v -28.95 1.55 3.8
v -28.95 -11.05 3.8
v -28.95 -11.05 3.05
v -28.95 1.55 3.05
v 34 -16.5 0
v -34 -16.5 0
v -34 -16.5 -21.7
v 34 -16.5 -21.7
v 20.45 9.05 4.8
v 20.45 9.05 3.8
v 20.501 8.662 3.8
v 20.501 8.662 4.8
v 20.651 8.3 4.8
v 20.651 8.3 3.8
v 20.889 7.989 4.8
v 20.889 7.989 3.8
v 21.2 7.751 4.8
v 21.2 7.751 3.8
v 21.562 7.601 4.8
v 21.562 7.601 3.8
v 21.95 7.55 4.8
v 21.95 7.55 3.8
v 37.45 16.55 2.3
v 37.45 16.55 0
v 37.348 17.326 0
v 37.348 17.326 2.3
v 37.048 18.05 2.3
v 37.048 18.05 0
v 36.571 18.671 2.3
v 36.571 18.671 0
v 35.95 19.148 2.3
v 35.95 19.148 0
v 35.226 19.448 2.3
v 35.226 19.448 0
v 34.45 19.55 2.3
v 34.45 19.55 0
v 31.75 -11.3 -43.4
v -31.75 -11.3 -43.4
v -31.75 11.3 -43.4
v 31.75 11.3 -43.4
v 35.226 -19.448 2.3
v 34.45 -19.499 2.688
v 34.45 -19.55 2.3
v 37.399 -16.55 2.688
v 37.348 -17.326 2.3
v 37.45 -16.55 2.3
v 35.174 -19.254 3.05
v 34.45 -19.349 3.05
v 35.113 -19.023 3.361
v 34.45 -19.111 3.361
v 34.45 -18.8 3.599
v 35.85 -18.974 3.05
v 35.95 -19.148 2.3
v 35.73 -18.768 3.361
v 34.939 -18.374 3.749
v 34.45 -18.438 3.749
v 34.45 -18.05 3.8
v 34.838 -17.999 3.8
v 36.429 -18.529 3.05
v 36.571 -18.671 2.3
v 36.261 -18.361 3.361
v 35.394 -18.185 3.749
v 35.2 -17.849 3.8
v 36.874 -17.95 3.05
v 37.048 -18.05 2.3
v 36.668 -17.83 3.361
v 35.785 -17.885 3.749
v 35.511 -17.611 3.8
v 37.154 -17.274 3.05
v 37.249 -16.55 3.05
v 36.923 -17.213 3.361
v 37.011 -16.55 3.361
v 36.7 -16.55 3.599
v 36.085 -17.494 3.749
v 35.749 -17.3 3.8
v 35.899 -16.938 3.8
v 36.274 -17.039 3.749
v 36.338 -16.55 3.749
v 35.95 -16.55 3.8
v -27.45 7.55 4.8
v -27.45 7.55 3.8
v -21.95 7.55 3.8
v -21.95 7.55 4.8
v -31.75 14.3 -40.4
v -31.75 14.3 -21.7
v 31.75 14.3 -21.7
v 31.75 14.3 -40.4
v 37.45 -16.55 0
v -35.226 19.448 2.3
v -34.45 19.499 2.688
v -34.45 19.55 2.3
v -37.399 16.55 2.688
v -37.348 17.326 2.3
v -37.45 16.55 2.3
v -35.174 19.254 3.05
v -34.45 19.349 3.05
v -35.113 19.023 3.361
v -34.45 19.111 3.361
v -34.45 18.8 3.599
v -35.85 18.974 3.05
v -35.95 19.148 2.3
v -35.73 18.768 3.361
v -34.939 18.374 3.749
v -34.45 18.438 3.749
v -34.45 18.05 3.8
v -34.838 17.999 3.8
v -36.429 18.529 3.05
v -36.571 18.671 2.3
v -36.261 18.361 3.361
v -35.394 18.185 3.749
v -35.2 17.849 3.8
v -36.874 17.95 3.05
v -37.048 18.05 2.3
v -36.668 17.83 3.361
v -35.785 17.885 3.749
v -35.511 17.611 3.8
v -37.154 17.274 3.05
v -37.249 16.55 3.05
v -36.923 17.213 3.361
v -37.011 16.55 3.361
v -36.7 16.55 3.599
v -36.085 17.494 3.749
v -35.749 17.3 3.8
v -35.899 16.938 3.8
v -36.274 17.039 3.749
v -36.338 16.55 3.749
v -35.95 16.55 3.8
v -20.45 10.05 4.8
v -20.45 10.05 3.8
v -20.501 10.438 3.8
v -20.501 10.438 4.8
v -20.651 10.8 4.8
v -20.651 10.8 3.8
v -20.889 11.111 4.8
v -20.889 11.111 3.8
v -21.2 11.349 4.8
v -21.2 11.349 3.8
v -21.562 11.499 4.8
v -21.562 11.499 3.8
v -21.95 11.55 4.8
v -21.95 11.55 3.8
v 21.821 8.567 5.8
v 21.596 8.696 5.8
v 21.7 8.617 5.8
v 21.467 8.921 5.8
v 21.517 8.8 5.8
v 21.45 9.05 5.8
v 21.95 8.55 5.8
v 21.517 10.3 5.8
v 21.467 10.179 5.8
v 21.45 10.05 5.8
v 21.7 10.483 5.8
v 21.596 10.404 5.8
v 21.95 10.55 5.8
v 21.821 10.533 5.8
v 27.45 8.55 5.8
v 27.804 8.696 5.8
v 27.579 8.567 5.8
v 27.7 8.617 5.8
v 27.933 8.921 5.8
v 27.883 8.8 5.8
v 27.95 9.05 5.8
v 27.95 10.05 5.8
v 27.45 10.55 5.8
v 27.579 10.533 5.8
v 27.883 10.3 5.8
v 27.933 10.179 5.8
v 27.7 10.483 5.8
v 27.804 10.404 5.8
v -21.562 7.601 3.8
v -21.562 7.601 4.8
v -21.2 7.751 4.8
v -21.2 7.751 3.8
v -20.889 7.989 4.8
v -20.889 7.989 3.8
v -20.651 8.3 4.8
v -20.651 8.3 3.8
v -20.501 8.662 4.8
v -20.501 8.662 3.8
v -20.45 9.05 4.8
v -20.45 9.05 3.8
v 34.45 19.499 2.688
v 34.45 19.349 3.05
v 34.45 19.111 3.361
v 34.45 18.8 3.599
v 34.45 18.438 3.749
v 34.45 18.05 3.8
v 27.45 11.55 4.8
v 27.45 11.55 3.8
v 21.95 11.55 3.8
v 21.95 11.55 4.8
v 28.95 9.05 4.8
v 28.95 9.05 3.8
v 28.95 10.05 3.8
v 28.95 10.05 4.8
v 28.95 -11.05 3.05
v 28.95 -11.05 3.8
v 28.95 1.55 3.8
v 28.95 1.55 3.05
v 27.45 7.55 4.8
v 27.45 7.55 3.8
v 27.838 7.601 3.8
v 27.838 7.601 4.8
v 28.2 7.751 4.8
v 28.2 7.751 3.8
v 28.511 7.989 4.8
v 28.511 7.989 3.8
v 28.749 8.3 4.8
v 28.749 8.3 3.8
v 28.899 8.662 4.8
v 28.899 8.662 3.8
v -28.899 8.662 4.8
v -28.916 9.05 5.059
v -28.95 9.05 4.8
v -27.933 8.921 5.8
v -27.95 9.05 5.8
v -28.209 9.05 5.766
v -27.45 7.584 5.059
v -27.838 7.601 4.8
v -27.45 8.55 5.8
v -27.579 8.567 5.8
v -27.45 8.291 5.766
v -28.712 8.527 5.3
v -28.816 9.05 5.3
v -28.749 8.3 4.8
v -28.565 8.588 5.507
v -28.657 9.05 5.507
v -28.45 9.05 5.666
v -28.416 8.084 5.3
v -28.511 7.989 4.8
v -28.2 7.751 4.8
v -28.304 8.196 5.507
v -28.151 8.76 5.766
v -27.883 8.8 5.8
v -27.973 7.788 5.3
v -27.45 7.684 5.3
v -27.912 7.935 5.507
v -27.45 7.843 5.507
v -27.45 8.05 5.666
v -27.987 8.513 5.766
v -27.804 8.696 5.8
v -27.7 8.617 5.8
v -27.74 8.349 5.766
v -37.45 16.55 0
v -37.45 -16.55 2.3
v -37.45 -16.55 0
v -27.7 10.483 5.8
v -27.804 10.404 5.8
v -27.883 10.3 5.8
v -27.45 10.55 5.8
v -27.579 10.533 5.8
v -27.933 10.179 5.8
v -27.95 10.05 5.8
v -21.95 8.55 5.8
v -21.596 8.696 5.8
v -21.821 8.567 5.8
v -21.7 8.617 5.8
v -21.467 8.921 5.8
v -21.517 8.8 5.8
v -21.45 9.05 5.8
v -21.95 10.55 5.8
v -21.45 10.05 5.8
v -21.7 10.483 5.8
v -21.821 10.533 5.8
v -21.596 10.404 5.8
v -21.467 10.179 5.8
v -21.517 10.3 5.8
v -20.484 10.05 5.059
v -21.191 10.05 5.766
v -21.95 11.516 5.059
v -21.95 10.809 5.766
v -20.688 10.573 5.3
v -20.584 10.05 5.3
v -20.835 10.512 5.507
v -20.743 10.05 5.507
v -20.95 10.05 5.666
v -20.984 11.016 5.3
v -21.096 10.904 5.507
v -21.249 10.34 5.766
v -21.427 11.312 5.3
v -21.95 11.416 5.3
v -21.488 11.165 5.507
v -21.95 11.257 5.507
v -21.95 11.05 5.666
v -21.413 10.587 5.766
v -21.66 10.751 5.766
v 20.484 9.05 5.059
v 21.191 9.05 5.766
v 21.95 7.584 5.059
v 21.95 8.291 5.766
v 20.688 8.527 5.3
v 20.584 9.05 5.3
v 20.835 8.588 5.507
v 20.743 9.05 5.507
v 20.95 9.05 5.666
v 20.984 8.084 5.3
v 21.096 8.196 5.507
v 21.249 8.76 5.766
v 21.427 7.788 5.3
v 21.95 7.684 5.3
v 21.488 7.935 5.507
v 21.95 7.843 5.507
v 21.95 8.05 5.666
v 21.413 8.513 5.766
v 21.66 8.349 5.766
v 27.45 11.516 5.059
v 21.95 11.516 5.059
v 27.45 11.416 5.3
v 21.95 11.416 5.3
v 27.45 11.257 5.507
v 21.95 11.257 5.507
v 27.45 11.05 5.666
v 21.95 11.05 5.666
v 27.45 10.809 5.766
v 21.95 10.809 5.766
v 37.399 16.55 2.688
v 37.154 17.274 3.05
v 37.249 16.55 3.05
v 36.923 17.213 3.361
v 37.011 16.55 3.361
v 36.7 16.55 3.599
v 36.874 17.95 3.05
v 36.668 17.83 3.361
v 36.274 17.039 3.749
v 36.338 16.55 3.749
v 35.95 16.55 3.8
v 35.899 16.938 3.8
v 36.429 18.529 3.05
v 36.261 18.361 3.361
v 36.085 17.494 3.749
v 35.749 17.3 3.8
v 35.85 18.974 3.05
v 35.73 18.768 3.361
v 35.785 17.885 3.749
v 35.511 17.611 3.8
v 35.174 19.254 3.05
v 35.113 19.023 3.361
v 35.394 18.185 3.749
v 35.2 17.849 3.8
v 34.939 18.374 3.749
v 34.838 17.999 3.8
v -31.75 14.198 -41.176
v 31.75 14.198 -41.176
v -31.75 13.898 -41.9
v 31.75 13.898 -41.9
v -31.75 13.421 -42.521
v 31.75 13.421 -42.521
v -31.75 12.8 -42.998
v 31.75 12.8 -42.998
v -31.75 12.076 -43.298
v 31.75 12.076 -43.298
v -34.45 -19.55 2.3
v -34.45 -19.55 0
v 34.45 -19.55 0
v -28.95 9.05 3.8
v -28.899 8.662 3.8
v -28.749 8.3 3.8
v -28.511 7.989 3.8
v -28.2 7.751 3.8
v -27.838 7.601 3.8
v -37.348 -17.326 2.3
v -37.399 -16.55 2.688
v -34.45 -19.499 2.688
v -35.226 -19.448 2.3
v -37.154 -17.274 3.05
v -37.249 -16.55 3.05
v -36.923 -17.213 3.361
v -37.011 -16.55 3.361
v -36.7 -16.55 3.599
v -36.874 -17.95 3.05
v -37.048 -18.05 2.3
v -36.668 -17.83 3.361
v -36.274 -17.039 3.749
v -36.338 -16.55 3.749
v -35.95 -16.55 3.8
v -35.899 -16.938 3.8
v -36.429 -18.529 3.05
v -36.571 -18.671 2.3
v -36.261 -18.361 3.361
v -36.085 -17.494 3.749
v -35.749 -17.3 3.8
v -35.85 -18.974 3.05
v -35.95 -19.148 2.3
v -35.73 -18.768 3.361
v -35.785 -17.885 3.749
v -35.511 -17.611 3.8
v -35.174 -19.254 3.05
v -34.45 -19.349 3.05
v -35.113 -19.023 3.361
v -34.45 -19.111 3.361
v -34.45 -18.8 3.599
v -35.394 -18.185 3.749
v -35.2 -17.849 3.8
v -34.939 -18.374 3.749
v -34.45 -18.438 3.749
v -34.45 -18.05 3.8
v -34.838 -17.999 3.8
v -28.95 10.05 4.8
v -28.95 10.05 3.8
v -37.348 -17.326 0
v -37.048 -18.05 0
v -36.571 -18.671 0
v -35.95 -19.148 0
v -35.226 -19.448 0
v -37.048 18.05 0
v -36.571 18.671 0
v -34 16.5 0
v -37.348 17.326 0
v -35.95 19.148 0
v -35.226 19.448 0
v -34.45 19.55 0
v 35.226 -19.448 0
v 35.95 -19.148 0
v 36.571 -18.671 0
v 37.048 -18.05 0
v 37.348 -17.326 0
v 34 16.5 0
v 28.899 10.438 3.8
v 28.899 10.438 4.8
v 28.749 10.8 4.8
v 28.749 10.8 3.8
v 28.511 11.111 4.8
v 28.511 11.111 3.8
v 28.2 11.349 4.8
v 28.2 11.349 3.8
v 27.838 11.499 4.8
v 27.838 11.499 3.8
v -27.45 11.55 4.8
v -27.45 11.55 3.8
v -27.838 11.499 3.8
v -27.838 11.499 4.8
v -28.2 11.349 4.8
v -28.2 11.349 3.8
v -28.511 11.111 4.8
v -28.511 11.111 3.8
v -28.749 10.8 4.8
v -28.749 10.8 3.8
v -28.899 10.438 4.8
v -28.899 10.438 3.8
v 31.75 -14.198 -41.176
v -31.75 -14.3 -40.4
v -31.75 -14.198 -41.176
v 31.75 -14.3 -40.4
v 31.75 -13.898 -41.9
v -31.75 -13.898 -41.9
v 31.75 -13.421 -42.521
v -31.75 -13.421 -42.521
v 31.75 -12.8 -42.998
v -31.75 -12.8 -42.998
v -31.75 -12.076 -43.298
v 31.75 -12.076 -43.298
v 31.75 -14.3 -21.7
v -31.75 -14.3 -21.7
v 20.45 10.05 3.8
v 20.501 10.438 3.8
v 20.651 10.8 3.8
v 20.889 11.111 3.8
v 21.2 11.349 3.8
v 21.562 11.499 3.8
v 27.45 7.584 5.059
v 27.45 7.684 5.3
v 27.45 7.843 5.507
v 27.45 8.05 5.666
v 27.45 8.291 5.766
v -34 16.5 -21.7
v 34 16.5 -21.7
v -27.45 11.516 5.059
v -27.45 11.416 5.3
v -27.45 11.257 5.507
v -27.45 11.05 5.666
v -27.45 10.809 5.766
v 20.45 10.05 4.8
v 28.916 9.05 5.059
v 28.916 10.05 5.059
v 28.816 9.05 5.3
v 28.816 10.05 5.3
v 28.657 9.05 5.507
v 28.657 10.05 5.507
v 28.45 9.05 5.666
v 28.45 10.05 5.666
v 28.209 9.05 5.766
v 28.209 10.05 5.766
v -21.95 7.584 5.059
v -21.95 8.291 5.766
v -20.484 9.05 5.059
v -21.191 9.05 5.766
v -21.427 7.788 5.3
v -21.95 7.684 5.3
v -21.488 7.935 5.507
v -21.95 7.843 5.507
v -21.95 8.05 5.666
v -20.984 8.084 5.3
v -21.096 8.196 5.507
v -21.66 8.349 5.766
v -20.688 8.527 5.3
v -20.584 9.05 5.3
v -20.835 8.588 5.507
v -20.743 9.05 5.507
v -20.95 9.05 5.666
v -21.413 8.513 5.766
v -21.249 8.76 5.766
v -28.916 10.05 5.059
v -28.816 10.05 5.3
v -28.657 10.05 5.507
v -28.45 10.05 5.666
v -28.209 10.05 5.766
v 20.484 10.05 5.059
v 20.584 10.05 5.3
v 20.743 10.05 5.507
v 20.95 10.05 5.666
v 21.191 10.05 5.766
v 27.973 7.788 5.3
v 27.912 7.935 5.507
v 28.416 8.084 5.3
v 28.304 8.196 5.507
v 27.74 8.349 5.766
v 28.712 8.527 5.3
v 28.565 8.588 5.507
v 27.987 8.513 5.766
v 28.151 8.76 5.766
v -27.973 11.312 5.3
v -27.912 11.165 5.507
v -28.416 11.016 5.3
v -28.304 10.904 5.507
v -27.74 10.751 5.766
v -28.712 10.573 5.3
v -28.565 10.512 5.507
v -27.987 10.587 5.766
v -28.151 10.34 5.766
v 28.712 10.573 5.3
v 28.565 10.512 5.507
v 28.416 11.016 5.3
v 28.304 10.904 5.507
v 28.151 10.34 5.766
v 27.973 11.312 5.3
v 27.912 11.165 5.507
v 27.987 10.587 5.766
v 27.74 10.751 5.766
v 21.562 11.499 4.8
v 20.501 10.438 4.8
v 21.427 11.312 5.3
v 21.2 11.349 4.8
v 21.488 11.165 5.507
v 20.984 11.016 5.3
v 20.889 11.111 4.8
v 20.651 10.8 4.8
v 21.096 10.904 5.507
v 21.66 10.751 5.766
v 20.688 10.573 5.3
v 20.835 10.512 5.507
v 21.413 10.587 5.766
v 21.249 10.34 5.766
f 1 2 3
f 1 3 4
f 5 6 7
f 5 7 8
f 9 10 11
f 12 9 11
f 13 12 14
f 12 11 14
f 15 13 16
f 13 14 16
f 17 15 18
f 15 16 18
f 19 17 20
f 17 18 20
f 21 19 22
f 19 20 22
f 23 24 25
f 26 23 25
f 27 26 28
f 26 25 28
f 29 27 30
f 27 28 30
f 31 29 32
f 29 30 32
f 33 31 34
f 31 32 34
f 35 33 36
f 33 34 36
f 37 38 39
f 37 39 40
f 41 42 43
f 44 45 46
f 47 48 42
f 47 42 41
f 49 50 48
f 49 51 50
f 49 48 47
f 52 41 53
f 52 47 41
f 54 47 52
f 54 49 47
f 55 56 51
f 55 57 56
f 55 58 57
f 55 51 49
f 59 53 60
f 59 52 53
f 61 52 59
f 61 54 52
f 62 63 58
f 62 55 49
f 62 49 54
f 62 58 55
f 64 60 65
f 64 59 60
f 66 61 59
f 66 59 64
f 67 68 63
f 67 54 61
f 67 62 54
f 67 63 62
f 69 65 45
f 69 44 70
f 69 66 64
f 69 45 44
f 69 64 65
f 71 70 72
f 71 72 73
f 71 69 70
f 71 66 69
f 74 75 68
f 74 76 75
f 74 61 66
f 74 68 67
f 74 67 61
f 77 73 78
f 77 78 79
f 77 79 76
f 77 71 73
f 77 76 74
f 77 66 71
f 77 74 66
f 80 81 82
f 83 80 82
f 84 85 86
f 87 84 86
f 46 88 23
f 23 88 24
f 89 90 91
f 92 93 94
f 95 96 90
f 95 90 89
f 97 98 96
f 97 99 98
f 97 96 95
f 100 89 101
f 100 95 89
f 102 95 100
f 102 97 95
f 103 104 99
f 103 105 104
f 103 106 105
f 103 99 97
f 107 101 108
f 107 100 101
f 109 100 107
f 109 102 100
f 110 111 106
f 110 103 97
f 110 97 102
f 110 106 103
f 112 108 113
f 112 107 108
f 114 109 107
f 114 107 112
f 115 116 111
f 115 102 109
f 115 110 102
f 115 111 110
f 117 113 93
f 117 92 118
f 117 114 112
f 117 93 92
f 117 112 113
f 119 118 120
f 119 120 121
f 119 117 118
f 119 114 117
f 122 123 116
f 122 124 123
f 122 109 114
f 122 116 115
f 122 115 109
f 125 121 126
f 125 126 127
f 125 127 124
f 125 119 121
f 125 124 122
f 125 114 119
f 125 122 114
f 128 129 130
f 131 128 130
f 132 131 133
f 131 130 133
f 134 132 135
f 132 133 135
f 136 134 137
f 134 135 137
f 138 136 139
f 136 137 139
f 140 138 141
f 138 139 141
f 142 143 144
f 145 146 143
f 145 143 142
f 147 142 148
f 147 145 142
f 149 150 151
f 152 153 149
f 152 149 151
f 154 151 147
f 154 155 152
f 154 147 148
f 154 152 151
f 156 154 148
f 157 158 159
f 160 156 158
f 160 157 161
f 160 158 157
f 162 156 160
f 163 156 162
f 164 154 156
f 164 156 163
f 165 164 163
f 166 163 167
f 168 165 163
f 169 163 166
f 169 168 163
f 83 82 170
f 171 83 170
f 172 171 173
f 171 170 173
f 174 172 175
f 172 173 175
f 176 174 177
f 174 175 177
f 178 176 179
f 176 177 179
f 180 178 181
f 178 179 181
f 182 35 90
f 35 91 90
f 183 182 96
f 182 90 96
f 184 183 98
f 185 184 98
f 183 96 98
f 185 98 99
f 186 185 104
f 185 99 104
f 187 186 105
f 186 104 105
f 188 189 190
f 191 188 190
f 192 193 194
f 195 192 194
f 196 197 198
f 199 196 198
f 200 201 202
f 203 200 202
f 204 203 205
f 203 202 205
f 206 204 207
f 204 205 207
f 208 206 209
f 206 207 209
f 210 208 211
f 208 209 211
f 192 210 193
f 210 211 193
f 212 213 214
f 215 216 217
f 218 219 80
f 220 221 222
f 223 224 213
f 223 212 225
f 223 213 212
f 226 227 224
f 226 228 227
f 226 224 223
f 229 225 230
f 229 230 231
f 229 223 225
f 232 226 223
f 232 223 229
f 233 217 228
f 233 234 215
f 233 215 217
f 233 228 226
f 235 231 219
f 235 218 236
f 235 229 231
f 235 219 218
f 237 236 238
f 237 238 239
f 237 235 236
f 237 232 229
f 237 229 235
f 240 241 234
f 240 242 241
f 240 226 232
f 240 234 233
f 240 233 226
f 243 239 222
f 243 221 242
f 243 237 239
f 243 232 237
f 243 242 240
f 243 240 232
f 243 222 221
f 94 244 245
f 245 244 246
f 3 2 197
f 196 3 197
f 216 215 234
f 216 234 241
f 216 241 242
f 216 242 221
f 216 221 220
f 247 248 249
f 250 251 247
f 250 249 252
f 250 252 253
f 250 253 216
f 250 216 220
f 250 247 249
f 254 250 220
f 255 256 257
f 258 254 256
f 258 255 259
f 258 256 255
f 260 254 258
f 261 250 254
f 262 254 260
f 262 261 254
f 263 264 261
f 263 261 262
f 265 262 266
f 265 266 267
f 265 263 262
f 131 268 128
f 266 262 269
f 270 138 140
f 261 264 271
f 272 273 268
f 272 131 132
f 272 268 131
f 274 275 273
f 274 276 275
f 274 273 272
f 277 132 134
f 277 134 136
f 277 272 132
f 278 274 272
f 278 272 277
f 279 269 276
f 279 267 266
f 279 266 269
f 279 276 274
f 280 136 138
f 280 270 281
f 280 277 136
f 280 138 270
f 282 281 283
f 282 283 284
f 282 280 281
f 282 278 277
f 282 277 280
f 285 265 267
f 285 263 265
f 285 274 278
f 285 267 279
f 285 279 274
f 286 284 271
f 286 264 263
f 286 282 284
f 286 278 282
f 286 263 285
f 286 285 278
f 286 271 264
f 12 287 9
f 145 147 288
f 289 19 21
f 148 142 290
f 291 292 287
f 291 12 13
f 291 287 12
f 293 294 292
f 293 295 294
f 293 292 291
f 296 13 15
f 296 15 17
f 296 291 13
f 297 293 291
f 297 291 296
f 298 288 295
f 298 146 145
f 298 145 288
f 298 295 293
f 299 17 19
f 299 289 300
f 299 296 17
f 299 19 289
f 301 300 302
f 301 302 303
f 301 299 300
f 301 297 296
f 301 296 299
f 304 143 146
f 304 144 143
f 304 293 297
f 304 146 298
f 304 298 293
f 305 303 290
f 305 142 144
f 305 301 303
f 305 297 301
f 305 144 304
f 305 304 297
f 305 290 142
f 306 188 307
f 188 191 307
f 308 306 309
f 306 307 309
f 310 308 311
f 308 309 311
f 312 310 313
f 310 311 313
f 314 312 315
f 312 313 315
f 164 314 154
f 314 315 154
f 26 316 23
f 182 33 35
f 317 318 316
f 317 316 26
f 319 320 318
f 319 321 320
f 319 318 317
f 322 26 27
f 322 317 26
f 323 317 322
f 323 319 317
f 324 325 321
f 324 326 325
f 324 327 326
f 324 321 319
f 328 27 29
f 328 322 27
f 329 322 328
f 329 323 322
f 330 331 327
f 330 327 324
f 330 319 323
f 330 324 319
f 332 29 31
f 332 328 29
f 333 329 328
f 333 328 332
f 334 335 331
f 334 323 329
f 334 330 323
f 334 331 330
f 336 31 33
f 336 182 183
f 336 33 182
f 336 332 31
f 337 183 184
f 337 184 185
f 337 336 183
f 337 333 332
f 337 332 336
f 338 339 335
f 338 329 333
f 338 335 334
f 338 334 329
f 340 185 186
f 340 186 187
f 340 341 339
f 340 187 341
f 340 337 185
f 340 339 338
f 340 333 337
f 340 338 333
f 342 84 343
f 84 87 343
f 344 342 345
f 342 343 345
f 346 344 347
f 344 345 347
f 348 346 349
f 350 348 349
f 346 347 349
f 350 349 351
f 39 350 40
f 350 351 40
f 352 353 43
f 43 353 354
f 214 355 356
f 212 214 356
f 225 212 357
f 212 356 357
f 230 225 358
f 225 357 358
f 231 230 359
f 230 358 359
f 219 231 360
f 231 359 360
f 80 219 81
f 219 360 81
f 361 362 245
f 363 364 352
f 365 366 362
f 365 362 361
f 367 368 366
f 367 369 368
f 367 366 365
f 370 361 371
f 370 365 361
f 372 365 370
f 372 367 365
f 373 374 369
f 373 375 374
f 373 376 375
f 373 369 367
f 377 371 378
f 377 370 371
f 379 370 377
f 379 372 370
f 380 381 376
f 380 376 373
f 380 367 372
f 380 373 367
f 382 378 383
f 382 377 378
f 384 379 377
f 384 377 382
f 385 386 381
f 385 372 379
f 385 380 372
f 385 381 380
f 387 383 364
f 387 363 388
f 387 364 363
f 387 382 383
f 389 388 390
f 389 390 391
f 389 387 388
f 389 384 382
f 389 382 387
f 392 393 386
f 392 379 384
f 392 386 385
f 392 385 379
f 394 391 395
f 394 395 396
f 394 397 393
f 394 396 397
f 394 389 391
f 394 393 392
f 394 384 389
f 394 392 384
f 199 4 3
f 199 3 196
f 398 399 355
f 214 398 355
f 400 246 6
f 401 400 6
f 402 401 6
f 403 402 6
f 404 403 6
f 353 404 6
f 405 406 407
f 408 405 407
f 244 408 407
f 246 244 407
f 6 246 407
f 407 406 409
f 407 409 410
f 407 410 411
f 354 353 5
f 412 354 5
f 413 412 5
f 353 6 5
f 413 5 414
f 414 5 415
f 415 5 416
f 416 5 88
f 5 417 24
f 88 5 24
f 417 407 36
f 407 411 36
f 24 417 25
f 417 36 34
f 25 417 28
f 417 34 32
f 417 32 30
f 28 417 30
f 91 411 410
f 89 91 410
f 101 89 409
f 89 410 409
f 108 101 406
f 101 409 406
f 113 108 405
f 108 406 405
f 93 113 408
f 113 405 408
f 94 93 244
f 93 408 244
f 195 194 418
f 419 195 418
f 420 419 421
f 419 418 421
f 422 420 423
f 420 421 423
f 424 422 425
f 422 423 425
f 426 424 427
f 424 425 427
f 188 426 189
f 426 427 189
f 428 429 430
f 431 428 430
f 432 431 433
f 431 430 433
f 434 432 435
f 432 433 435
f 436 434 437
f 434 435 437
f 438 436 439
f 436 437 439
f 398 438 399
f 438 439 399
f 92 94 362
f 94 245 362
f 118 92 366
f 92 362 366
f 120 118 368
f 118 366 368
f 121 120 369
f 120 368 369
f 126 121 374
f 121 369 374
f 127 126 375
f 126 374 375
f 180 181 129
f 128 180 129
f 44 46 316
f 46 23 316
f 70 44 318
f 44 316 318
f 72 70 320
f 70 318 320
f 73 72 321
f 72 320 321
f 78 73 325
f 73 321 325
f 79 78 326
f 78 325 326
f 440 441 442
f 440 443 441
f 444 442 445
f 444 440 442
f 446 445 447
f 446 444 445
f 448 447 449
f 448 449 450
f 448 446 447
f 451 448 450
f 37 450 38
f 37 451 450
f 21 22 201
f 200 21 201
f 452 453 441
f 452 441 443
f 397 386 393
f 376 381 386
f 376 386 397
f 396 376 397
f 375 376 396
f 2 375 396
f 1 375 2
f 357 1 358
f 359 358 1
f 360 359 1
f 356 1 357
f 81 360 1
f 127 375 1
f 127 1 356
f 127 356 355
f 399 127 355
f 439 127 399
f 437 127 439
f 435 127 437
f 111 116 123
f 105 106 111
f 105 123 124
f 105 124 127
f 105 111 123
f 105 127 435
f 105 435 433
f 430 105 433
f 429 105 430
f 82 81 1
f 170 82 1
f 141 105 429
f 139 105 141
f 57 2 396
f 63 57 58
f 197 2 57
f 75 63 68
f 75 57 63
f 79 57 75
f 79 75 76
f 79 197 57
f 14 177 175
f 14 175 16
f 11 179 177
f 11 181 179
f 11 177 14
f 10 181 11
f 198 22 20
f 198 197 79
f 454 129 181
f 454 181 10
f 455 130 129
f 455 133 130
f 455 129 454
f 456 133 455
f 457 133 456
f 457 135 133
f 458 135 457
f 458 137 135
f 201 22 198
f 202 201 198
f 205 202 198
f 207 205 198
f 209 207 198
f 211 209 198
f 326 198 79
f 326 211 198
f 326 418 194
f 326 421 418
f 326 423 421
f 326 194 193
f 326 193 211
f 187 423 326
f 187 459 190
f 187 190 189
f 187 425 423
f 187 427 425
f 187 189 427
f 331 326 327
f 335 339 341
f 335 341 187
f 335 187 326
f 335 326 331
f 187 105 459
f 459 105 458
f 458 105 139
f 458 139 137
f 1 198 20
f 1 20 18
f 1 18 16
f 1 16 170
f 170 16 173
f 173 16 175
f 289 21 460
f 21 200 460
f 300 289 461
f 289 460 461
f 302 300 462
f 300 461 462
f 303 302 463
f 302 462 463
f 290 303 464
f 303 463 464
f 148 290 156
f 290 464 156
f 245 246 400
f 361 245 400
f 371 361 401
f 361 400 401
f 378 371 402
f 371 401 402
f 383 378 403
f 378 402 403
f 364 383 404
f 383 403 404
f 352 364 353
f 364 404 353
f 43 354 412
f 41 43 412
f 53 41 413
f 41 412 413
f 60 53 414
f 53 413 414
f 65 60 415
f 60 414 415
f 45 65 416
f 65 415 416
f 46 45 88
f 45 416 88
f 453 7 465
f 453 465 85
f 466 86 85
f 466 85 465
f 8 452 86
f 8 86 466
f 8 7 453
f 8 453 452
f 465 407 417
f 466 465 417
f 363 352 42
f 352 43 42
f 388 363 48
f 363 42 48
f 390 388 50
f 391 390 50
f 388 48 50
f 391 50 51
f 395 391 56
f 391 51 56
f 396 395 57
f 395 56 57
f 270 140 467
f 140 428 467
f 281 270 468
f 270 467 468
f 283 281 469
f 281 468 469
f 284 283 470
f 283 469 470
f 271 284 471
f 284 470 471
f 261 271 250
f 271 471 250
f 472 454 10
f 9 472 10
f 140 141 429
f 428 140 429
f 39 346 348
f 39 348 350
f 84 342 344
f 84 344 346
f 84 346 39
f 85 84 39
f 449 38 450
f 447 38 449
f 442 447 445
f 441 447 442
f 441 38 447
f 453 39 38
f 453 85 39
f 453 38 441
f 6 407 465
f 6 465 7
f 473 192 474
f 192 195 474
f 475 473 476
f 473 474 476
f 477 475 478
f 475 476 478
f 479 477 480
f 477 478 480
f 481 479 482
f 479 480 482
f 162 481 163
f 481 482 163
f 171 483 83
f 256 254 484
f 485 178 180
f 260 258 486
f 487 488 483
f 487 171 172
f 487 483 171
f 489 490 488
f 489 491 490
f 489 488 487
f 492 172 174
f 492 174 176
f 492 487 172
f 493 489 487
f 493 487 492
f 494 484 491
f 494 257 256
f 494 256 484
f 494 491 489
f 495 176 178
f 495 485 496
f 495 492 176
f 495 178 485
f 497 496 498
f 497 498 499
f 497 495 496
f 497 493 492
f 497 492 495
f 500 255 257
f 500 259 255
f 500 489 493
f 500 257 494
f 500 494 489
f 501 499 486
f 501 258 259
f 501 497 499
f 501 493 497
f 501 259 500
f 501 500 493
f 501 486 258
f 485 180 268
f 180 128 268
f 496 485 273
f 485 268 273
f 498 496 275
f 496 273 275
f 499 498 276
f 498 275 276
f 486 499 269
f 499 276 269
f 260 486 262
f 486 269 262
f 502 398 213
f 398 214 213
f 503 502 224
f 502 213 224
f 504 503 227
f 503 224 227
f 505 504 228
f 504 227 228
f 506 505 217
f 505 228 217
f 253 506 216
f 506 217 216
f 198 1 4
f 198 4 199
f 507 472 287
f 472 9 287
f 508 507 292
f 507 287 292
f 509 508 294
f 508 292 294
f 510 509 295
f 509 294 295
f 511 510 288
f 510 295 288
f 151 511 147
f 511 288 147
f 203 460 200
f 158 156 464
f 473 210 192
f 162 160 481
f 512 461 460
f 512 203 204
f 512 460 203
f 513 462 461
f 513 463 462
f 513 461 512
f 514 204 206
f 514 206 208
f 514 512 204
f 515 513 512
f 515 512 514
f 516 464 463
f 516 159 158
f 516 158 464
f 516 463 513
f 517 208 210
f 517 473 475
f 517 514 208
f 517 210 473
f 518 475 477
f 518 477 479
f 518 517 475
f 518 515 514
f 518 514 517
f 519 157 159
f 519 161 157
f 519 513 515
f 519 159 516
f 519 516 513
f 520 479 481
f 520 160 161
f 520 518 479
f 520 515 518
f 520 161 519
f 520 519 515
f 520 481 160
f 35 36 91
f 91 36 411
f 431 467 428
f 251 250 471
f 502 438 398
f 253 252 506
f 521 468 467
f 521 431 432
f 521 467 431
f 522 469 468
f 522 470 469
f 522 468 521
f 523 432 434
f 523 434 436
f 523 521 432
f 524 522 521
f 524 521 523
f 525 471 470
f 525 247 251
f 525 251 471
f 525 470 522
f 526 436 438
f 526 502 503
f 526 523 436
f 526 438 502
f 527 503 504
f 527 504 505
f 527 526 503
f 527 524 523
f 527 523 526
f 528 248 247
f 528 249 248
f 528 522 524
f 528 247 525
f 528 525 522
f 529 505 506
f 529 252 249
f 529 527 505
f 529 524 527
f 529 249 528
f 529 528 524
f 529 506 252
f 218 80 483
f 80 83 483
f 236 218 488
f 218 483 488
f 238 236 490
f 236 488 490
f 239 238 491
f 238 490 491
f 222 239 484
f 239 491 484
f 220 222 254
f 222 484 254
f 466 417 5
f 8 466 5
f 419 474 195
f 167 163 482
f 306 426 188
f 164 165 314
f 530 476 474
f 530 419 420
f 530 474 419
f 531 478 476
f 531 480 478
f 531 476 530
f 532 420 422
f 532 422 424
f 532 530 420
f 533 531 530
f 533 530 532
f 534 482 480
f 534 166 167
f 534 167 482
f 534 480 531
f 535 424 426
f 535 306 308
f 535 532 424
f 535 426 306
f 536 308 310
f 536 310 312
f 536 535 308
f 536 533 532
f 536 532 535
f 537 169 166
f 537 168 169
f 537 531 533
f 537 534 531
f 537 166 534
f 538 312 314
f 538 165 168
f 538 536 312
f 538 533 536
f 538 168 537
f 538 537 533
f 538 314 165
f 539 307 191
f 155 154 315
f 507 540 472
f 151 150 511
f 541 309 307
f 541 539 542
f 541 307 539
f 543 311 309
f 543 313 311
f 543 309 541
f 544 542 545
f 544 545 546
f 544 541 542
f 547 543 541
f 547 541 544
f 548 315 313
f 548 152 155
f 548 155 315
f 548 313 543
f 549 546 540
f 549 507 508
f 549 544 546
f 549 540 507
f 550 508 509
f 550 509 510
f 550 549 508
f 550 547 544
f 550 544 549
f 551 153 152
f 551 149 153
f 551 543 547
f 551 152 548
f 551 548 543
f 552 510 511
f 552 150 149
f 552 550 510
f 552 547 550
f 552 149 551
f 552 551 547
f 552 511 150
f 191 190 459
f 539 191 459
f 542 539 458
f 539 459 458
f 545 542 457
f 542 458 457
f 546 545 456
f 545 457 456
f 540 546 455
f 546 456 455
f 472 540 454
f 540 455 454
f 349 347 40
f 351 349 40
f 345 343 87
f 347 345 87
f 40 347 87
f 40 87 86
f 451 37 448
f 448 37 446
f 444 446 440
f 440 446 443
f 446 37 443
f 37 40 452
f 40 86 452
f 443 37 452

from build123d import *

# Parameters (mm, degrees)
F1_DEPTH  = 3.8
F2_R      = 1.5
F3_W      = 68
F3_H      = 33
F4_DEPTH  = 21.7
F5_W      = 63.5
F5_H      = 28.6
F6_DEPTH  = 21.7
F7_R      = 3
F9_DEPTH  = 2
F10_R     = 1
F8_W      = 57.9
F8_H      = 12.6
F11_DEPTH = 0.75


with BuildPart() as f1:
    # F0 (on Top) → F1 (new body)
    with BuildSketch(Plane.XY):
        with BuildLine():
            Line((-34.45, -19.55), (34.45, -19.55))
            ThreePointArc((34.45, -19.55), (36.57132, -18.67132), (37.45, -16.55))
            Line((37.45, -16.55), (37.45, 16.55))
            ThreePointArc((37.45, 16.55), (36.57132, 18.67132), (34.45, 19.55))
            Line((34.45, 19.55), (-34.45, 19.55))
            ThreePointArc((-34.45, 19.55), (-36.57132, 18.67132), (-37.45, 16.55))
            Line((-37.45, 16.55), (-37.45, -16.55))
            ThreePointArc((-37.45, -16.55), (-36.57132, -18.67132), (-34.45, -19.55))
        make_face()
    extrude(amount=F1_DEPTH)

    # F2
    f2_edges = [f1.edges().sort_by_distance(p)[0] for p in [
        (0, -19.55, 3.8),
        (36.57132, -18.67132, 3.8),
        (37.45, 0, 3.8),
        (36.57132, 18.67132, 3.8),
        (0, 19.55, 3.8),
        (-36.57132, 18.67132, 3.8),
        (-37.45, 0, 3.8),
        (-36.57132, -18.67132, 3.8),
    ]]
    fillet(f2_edges, radius=F2_R)

    # F3 (on face) → F4 (join)
    with BuildSketch(Plane(origin=(0, 0, 0), x_dir=(1, 0, 0), z_dir=(0, 0, -1))):
        Rectangle(F3_W, F3_H)
    extrude(amount=F4_DEPTH)

    # F5 (on face) → F6 (join)
    with BuildSketch(Plane(origin=(0, 0, -21.7), x_dir=(1, 0, 0), z_dir=(0, 0, -1))):
        Rectangle(F5_W, F5_H)
    extrude(amount=F6_DEPTH)

    # F7
    f7_edges = [f1.edges().sort_by_distance(p)[0] for p in [
        (0, -14.3, -43.4),
        (0, 14.3, -43.4),
    ]]
    fillet(f7_edges, radius=F7_R)

    # F8 (on face) → F9 (join)
    with BuildSketch(Plane.XY.offset(3.8)):
        with BuildLine():
            Line((21.95, 7.55), (27.45, 7.55))
            ThreePointArc((27.45, 7.55), (28.51066, 7.98934), (28.95, 9.05))
            Line((28.95, 9.05), (28.95, 10.05))
            ThreePointArc((28.95, 10.05), (28.51066, 11.11066), (27.45, 11.55))
            Line((27.45, 11.55), (21.95, 11.55))
            ThreePointArc((21.95, 11.55), (20.88934, 11.11066), (20.45, 10.05))
            Line((20.45, 10.05), (20.45, 9.05))
            ThreePointArc((20.45, 9.05), (20.88934, 7.98934), (21.95, 7.55))
        make_face()
        with BuildLine():
            ThreePointArc((-21.95, 7.55), (-20.88934, 7.98934), (-20.45, 9.05))
            Line((-20.45, 9.05), (-20.45, 10.05))
            ThreePointArc((-20.45, 10.05), (-20.88934, 11.11066), (-21.95, 11.55))
            Line((-21.95, 11.55), (-27.45, 11.55))
            ThreePointArc((-27.45, 11.55), (-28.51066, 11.11066), (-28.95, 10.05))
            Line((-28.95, 10.05), (-28.95, 9.05))
            ThreePointArc((-28.95, 9.05), (-28.51066, 7.98934), (-27.45, 7.55))
            Line((-27.45, 7.55), (-21.95, 7.55))
        make_face()
    extrude(amount=F9_DEPTH)

    # F10
    f10_edges = [f1.edges().sort_by_distance(p)[0] for p in [
        (20.88934, 7.98934, 5.8),
        (24.7, 7.55, 5.8),
        (28.51066, 7.98934, 5.8),
        (28.95, 9.55, 5.8),
        (28.51066, 11.11066, 5.8),
        (24.7, 11.55, 5.8),
        (20.88934, 11.11066, 5.8),
        (20.45, 9.55, 5.8),
        (-20.88934, 7.98934, 5.8),
        (-20.45, 9.55, 5.8),
        (-20.88934, 11.11066, 5.8),
        (-24.7, 11.55, 5.8),
        (-28.51066, 11.11066, 5.8),
        (-28.95, 9.55, 5.8),
        (-28.51066, 7.98934, 5.8),
        (-24.7, 7.55, 5.8),
    ]]
    fillet(f10_edges, radius=F10_R)

    # F8 (on face) → F11 (cut)
    with BuildSketch(Plane.XY.offset(3.8)):
        with Locations((0, -4.75)):
            Rectangle(F8_W, F8_H)
    extrude(amount=-F11_DEPTH, mode=Mode.SUBTRACT)


solid = f1.part
